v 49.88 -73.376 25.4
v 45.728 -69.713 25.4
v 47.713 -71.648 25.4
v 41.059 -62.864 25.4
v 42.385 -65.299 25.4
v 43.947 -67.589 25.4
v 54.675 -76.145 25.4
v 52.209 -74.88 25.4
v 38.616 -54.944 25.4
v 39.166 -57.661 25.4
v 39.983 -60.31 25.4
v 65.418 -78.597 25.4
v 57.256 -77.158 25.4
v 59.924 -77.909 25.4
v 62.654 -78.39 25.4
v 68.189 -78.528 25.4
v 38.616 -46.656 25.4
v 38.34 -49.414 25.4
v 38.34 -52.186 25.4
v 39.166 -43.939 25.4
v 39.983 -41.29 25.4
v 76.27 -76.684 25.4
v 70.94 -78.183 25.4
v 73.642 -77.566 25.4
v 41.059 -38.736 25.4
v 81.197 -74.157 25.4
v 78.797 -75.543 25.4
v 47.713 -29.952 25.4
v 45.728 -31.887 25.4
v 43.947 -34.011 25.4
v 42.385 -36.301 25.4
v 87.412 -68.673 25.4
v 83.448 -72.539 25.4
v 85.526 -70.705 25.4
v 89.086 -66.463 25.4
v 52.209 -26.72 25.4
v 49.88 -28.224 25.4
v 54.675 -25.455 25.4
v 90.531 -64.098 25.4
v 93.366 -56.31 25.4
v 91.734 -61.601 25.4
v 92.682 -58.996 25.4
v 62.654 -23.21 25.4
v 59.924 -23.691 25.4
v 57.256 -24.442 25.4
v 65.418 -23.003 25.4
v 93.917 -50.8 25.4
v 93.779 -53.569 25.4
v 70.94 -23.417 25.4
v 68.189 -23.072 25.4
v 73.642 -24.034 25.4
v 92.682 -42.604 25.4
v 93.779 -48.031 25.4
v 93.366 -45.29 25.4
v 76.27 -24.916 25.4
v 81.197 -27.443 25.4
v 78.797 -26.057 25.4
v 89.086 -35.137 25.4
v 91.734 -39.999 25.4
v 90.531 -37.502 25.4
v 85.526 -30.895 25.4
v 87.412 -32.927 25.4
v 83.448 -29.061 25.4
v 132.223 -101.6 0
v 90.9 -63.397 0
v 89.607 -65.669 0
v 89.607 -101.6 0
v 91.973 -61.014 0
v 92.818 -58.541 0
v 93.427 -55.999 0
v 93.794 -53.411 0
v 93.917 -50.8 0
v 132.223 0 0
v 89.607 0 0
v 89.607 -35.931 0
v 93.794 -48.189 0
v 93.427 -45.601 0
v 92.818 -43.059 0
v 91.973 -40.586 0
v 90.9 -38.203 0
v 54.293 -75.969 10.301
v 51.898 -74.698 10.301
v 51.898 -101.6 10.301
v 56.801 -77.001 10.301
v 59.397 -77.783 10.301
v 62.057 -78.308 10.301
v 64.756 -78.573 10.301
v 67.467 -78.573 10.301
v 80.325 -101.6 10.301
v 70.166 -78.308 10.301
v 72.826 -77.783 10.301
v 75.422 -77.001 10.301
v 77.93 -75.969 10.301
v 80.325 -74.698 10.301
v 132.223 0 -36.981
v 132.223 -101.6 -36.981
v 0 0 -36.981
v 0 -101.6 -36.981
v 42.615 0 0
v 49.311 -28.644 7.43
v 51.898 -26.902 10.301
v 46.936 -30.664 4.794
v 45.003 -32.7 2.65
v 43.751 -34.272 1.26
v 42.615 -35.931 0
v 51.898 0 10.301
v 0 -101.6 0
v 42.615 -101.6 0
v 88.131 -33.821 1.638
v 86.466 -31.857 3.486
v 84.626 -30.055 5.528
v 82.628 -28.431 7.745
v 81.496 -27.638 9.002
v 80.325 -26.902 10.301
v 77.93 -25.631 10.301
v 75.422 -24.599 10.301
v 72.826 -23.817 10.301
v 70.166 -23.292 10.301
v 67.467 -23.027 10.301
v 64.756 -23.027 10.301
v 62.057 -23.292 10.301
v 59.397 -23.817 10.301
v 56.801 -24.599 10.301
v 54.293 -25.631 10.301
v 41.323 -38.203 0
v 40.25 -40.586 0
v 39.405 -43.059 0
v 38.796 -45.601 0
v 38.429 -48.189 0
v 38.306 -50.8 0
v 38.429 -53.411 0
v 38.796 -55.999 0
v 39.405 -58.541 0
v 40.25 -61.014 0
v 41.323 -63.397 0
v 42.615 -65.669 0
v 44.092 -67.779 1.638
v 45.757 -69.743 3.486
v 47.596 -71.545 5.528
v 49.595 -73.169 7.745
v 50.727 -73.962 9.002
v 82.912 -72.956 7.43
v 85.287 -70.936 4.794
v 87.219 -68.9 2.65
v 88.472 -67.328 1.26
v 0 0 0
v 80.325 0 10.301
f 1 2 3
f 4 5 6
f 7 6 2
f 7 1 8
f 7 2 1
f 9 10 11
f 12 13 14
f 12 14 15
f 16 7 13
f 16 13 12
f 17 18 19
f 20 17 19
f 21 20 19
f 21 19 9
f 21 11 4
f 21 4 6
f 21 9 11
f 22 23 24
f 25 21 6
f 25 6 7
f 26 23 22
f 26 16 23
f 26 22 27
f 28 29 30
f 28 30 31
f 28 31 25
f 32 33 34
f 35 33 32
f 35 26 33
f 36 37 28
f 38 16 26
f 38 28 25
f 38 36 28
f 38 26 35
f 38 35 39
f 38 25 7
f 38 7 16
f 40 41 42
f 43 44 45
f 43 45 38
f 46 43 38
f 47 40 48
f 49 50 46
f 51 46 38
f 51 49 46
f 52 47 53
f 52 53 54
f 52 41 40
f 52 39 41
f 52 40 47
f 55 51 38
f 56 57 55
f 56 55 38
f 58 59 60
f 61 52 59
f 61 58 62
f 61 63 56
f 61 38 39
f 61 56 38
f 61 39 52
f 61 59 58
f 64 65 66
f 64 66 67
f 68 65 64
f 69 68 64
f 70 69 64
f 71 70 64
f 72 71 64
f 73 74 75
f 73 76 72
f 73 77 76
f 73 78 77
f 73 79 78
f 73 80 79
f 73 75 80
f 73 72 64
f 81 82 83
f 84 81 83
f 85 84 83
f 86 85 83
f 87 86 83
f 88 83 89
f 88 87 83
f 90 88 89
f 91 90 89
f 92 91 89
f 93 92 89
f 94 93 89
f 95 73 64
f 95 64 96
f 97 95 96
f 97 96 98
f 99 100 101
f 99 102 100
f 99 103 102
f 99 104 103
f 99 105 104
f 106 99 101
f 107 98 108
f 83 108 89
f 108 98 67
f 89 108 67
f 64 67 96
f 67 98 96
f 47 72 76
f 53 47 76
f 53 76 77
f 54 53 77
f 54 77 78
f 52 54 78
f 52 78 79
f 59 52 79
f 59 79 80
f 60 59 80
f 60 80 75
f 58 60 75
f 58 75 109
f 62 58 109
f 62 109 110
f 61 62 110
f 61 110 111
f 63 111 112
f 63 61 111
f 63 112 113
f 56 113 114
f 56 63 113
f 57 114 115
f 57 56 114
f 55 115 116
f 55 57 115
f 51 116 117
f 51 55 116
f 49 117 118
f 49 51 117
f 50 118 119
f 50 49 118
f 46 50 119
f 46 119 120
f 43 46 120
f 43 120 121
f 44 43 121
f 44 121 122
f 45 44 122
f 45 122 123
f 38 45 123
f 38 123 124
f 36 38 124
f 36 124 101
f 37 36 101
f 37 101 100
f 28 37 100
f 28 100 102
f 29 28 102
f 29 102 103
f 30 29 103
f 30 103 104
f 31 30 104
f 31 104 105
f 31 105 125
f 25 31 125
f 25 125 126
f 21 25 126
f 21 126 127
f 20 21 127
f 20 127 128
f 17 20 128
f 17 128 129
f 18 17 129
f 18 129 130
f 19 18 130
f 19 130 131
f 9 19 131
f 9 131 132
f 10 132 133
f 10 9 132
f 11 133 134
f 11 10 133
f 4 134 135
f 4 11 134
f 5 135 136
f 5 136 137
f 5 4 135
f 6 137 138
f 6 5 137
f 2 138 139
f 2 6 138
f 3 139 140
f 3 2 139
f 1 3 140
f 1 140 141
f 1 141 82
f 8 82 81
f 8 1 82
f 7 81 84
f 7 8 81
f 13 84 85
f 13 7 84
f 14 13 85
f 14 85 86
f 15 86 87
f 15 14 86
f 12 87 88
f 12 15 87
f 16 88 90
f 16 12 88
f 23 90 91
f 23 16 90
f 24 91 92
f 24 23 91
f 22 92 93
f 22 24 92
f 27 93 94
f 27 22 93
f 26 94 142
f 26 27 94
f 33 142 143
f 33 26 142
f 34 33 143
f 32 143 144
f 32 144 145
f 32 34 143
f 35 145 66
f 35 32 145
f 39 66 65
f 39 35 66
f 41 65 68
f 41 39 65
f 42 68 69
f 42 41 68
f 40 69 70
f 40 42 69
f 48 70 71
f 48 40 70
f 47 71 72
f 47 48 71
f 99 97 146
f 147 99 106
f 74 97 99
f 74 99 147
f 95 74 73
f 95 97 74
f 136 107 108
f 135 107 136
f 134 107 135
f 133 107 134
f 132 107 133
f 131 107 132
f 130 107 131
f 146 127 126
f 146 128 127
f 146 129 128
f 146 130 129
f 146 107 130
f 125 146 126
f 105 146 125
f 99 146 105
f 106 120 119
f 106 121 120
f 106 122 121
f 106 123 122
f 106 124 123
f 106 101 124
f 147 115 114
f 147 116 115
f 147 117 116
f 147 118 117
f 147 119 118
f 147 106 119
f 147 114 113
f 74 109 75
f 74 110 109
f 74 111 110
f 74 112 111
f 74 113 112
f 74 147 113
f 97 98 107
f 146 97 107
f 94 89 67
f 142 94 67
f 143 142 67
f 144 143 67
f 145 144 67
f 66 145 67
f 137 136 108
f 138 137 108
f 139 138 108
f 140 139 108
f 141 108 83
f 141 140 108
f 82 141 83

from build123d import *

# Parameters (mm, degrees)
EXTRUDE1_DEPTH = 101.6
EXTRUDE2_REACH = 180.036
SKETCH2_R      = 27.805675623


with BuildPart() as part:
    # Sketch1 → Extrude1 (new body)
    with BuildSketch(Plane(origin=(0, 0, 0), x_dir=(1, 0, 0), z_dir=(0, 1, 0))):
        Polygon((0, 36.981224411), (0, 0), (42.615353822, 0), (51.897733448, -10.30089681), (80.325021053, -10.30089681), (89.607400679, 0), (132.222754501, 0), (132.222754501, 36.981224411), align=None)
    extrude(amount=-EXTRUDE1_DEPTH)

    # Sketch2 → Extrude2 (add, up to next)
    with BuildSketch(Plane.XY.offset(25.4), mode=Mode.PRIVATE) as extrude2_sk1:
        with Locations((66.111377251, -50.8)):
            Circle(SKETCH2_R)
    extrude2_tool1 = extrude(extrude2_sk1.sketch, amount=-EXTRUDE2_REACH, mode=Mode.PRIVATE) - part.part
    add(extrude2_tool1.solids().sort_by_distance((66.111377, -50.8, 25.4))[0])


solid = part.part
